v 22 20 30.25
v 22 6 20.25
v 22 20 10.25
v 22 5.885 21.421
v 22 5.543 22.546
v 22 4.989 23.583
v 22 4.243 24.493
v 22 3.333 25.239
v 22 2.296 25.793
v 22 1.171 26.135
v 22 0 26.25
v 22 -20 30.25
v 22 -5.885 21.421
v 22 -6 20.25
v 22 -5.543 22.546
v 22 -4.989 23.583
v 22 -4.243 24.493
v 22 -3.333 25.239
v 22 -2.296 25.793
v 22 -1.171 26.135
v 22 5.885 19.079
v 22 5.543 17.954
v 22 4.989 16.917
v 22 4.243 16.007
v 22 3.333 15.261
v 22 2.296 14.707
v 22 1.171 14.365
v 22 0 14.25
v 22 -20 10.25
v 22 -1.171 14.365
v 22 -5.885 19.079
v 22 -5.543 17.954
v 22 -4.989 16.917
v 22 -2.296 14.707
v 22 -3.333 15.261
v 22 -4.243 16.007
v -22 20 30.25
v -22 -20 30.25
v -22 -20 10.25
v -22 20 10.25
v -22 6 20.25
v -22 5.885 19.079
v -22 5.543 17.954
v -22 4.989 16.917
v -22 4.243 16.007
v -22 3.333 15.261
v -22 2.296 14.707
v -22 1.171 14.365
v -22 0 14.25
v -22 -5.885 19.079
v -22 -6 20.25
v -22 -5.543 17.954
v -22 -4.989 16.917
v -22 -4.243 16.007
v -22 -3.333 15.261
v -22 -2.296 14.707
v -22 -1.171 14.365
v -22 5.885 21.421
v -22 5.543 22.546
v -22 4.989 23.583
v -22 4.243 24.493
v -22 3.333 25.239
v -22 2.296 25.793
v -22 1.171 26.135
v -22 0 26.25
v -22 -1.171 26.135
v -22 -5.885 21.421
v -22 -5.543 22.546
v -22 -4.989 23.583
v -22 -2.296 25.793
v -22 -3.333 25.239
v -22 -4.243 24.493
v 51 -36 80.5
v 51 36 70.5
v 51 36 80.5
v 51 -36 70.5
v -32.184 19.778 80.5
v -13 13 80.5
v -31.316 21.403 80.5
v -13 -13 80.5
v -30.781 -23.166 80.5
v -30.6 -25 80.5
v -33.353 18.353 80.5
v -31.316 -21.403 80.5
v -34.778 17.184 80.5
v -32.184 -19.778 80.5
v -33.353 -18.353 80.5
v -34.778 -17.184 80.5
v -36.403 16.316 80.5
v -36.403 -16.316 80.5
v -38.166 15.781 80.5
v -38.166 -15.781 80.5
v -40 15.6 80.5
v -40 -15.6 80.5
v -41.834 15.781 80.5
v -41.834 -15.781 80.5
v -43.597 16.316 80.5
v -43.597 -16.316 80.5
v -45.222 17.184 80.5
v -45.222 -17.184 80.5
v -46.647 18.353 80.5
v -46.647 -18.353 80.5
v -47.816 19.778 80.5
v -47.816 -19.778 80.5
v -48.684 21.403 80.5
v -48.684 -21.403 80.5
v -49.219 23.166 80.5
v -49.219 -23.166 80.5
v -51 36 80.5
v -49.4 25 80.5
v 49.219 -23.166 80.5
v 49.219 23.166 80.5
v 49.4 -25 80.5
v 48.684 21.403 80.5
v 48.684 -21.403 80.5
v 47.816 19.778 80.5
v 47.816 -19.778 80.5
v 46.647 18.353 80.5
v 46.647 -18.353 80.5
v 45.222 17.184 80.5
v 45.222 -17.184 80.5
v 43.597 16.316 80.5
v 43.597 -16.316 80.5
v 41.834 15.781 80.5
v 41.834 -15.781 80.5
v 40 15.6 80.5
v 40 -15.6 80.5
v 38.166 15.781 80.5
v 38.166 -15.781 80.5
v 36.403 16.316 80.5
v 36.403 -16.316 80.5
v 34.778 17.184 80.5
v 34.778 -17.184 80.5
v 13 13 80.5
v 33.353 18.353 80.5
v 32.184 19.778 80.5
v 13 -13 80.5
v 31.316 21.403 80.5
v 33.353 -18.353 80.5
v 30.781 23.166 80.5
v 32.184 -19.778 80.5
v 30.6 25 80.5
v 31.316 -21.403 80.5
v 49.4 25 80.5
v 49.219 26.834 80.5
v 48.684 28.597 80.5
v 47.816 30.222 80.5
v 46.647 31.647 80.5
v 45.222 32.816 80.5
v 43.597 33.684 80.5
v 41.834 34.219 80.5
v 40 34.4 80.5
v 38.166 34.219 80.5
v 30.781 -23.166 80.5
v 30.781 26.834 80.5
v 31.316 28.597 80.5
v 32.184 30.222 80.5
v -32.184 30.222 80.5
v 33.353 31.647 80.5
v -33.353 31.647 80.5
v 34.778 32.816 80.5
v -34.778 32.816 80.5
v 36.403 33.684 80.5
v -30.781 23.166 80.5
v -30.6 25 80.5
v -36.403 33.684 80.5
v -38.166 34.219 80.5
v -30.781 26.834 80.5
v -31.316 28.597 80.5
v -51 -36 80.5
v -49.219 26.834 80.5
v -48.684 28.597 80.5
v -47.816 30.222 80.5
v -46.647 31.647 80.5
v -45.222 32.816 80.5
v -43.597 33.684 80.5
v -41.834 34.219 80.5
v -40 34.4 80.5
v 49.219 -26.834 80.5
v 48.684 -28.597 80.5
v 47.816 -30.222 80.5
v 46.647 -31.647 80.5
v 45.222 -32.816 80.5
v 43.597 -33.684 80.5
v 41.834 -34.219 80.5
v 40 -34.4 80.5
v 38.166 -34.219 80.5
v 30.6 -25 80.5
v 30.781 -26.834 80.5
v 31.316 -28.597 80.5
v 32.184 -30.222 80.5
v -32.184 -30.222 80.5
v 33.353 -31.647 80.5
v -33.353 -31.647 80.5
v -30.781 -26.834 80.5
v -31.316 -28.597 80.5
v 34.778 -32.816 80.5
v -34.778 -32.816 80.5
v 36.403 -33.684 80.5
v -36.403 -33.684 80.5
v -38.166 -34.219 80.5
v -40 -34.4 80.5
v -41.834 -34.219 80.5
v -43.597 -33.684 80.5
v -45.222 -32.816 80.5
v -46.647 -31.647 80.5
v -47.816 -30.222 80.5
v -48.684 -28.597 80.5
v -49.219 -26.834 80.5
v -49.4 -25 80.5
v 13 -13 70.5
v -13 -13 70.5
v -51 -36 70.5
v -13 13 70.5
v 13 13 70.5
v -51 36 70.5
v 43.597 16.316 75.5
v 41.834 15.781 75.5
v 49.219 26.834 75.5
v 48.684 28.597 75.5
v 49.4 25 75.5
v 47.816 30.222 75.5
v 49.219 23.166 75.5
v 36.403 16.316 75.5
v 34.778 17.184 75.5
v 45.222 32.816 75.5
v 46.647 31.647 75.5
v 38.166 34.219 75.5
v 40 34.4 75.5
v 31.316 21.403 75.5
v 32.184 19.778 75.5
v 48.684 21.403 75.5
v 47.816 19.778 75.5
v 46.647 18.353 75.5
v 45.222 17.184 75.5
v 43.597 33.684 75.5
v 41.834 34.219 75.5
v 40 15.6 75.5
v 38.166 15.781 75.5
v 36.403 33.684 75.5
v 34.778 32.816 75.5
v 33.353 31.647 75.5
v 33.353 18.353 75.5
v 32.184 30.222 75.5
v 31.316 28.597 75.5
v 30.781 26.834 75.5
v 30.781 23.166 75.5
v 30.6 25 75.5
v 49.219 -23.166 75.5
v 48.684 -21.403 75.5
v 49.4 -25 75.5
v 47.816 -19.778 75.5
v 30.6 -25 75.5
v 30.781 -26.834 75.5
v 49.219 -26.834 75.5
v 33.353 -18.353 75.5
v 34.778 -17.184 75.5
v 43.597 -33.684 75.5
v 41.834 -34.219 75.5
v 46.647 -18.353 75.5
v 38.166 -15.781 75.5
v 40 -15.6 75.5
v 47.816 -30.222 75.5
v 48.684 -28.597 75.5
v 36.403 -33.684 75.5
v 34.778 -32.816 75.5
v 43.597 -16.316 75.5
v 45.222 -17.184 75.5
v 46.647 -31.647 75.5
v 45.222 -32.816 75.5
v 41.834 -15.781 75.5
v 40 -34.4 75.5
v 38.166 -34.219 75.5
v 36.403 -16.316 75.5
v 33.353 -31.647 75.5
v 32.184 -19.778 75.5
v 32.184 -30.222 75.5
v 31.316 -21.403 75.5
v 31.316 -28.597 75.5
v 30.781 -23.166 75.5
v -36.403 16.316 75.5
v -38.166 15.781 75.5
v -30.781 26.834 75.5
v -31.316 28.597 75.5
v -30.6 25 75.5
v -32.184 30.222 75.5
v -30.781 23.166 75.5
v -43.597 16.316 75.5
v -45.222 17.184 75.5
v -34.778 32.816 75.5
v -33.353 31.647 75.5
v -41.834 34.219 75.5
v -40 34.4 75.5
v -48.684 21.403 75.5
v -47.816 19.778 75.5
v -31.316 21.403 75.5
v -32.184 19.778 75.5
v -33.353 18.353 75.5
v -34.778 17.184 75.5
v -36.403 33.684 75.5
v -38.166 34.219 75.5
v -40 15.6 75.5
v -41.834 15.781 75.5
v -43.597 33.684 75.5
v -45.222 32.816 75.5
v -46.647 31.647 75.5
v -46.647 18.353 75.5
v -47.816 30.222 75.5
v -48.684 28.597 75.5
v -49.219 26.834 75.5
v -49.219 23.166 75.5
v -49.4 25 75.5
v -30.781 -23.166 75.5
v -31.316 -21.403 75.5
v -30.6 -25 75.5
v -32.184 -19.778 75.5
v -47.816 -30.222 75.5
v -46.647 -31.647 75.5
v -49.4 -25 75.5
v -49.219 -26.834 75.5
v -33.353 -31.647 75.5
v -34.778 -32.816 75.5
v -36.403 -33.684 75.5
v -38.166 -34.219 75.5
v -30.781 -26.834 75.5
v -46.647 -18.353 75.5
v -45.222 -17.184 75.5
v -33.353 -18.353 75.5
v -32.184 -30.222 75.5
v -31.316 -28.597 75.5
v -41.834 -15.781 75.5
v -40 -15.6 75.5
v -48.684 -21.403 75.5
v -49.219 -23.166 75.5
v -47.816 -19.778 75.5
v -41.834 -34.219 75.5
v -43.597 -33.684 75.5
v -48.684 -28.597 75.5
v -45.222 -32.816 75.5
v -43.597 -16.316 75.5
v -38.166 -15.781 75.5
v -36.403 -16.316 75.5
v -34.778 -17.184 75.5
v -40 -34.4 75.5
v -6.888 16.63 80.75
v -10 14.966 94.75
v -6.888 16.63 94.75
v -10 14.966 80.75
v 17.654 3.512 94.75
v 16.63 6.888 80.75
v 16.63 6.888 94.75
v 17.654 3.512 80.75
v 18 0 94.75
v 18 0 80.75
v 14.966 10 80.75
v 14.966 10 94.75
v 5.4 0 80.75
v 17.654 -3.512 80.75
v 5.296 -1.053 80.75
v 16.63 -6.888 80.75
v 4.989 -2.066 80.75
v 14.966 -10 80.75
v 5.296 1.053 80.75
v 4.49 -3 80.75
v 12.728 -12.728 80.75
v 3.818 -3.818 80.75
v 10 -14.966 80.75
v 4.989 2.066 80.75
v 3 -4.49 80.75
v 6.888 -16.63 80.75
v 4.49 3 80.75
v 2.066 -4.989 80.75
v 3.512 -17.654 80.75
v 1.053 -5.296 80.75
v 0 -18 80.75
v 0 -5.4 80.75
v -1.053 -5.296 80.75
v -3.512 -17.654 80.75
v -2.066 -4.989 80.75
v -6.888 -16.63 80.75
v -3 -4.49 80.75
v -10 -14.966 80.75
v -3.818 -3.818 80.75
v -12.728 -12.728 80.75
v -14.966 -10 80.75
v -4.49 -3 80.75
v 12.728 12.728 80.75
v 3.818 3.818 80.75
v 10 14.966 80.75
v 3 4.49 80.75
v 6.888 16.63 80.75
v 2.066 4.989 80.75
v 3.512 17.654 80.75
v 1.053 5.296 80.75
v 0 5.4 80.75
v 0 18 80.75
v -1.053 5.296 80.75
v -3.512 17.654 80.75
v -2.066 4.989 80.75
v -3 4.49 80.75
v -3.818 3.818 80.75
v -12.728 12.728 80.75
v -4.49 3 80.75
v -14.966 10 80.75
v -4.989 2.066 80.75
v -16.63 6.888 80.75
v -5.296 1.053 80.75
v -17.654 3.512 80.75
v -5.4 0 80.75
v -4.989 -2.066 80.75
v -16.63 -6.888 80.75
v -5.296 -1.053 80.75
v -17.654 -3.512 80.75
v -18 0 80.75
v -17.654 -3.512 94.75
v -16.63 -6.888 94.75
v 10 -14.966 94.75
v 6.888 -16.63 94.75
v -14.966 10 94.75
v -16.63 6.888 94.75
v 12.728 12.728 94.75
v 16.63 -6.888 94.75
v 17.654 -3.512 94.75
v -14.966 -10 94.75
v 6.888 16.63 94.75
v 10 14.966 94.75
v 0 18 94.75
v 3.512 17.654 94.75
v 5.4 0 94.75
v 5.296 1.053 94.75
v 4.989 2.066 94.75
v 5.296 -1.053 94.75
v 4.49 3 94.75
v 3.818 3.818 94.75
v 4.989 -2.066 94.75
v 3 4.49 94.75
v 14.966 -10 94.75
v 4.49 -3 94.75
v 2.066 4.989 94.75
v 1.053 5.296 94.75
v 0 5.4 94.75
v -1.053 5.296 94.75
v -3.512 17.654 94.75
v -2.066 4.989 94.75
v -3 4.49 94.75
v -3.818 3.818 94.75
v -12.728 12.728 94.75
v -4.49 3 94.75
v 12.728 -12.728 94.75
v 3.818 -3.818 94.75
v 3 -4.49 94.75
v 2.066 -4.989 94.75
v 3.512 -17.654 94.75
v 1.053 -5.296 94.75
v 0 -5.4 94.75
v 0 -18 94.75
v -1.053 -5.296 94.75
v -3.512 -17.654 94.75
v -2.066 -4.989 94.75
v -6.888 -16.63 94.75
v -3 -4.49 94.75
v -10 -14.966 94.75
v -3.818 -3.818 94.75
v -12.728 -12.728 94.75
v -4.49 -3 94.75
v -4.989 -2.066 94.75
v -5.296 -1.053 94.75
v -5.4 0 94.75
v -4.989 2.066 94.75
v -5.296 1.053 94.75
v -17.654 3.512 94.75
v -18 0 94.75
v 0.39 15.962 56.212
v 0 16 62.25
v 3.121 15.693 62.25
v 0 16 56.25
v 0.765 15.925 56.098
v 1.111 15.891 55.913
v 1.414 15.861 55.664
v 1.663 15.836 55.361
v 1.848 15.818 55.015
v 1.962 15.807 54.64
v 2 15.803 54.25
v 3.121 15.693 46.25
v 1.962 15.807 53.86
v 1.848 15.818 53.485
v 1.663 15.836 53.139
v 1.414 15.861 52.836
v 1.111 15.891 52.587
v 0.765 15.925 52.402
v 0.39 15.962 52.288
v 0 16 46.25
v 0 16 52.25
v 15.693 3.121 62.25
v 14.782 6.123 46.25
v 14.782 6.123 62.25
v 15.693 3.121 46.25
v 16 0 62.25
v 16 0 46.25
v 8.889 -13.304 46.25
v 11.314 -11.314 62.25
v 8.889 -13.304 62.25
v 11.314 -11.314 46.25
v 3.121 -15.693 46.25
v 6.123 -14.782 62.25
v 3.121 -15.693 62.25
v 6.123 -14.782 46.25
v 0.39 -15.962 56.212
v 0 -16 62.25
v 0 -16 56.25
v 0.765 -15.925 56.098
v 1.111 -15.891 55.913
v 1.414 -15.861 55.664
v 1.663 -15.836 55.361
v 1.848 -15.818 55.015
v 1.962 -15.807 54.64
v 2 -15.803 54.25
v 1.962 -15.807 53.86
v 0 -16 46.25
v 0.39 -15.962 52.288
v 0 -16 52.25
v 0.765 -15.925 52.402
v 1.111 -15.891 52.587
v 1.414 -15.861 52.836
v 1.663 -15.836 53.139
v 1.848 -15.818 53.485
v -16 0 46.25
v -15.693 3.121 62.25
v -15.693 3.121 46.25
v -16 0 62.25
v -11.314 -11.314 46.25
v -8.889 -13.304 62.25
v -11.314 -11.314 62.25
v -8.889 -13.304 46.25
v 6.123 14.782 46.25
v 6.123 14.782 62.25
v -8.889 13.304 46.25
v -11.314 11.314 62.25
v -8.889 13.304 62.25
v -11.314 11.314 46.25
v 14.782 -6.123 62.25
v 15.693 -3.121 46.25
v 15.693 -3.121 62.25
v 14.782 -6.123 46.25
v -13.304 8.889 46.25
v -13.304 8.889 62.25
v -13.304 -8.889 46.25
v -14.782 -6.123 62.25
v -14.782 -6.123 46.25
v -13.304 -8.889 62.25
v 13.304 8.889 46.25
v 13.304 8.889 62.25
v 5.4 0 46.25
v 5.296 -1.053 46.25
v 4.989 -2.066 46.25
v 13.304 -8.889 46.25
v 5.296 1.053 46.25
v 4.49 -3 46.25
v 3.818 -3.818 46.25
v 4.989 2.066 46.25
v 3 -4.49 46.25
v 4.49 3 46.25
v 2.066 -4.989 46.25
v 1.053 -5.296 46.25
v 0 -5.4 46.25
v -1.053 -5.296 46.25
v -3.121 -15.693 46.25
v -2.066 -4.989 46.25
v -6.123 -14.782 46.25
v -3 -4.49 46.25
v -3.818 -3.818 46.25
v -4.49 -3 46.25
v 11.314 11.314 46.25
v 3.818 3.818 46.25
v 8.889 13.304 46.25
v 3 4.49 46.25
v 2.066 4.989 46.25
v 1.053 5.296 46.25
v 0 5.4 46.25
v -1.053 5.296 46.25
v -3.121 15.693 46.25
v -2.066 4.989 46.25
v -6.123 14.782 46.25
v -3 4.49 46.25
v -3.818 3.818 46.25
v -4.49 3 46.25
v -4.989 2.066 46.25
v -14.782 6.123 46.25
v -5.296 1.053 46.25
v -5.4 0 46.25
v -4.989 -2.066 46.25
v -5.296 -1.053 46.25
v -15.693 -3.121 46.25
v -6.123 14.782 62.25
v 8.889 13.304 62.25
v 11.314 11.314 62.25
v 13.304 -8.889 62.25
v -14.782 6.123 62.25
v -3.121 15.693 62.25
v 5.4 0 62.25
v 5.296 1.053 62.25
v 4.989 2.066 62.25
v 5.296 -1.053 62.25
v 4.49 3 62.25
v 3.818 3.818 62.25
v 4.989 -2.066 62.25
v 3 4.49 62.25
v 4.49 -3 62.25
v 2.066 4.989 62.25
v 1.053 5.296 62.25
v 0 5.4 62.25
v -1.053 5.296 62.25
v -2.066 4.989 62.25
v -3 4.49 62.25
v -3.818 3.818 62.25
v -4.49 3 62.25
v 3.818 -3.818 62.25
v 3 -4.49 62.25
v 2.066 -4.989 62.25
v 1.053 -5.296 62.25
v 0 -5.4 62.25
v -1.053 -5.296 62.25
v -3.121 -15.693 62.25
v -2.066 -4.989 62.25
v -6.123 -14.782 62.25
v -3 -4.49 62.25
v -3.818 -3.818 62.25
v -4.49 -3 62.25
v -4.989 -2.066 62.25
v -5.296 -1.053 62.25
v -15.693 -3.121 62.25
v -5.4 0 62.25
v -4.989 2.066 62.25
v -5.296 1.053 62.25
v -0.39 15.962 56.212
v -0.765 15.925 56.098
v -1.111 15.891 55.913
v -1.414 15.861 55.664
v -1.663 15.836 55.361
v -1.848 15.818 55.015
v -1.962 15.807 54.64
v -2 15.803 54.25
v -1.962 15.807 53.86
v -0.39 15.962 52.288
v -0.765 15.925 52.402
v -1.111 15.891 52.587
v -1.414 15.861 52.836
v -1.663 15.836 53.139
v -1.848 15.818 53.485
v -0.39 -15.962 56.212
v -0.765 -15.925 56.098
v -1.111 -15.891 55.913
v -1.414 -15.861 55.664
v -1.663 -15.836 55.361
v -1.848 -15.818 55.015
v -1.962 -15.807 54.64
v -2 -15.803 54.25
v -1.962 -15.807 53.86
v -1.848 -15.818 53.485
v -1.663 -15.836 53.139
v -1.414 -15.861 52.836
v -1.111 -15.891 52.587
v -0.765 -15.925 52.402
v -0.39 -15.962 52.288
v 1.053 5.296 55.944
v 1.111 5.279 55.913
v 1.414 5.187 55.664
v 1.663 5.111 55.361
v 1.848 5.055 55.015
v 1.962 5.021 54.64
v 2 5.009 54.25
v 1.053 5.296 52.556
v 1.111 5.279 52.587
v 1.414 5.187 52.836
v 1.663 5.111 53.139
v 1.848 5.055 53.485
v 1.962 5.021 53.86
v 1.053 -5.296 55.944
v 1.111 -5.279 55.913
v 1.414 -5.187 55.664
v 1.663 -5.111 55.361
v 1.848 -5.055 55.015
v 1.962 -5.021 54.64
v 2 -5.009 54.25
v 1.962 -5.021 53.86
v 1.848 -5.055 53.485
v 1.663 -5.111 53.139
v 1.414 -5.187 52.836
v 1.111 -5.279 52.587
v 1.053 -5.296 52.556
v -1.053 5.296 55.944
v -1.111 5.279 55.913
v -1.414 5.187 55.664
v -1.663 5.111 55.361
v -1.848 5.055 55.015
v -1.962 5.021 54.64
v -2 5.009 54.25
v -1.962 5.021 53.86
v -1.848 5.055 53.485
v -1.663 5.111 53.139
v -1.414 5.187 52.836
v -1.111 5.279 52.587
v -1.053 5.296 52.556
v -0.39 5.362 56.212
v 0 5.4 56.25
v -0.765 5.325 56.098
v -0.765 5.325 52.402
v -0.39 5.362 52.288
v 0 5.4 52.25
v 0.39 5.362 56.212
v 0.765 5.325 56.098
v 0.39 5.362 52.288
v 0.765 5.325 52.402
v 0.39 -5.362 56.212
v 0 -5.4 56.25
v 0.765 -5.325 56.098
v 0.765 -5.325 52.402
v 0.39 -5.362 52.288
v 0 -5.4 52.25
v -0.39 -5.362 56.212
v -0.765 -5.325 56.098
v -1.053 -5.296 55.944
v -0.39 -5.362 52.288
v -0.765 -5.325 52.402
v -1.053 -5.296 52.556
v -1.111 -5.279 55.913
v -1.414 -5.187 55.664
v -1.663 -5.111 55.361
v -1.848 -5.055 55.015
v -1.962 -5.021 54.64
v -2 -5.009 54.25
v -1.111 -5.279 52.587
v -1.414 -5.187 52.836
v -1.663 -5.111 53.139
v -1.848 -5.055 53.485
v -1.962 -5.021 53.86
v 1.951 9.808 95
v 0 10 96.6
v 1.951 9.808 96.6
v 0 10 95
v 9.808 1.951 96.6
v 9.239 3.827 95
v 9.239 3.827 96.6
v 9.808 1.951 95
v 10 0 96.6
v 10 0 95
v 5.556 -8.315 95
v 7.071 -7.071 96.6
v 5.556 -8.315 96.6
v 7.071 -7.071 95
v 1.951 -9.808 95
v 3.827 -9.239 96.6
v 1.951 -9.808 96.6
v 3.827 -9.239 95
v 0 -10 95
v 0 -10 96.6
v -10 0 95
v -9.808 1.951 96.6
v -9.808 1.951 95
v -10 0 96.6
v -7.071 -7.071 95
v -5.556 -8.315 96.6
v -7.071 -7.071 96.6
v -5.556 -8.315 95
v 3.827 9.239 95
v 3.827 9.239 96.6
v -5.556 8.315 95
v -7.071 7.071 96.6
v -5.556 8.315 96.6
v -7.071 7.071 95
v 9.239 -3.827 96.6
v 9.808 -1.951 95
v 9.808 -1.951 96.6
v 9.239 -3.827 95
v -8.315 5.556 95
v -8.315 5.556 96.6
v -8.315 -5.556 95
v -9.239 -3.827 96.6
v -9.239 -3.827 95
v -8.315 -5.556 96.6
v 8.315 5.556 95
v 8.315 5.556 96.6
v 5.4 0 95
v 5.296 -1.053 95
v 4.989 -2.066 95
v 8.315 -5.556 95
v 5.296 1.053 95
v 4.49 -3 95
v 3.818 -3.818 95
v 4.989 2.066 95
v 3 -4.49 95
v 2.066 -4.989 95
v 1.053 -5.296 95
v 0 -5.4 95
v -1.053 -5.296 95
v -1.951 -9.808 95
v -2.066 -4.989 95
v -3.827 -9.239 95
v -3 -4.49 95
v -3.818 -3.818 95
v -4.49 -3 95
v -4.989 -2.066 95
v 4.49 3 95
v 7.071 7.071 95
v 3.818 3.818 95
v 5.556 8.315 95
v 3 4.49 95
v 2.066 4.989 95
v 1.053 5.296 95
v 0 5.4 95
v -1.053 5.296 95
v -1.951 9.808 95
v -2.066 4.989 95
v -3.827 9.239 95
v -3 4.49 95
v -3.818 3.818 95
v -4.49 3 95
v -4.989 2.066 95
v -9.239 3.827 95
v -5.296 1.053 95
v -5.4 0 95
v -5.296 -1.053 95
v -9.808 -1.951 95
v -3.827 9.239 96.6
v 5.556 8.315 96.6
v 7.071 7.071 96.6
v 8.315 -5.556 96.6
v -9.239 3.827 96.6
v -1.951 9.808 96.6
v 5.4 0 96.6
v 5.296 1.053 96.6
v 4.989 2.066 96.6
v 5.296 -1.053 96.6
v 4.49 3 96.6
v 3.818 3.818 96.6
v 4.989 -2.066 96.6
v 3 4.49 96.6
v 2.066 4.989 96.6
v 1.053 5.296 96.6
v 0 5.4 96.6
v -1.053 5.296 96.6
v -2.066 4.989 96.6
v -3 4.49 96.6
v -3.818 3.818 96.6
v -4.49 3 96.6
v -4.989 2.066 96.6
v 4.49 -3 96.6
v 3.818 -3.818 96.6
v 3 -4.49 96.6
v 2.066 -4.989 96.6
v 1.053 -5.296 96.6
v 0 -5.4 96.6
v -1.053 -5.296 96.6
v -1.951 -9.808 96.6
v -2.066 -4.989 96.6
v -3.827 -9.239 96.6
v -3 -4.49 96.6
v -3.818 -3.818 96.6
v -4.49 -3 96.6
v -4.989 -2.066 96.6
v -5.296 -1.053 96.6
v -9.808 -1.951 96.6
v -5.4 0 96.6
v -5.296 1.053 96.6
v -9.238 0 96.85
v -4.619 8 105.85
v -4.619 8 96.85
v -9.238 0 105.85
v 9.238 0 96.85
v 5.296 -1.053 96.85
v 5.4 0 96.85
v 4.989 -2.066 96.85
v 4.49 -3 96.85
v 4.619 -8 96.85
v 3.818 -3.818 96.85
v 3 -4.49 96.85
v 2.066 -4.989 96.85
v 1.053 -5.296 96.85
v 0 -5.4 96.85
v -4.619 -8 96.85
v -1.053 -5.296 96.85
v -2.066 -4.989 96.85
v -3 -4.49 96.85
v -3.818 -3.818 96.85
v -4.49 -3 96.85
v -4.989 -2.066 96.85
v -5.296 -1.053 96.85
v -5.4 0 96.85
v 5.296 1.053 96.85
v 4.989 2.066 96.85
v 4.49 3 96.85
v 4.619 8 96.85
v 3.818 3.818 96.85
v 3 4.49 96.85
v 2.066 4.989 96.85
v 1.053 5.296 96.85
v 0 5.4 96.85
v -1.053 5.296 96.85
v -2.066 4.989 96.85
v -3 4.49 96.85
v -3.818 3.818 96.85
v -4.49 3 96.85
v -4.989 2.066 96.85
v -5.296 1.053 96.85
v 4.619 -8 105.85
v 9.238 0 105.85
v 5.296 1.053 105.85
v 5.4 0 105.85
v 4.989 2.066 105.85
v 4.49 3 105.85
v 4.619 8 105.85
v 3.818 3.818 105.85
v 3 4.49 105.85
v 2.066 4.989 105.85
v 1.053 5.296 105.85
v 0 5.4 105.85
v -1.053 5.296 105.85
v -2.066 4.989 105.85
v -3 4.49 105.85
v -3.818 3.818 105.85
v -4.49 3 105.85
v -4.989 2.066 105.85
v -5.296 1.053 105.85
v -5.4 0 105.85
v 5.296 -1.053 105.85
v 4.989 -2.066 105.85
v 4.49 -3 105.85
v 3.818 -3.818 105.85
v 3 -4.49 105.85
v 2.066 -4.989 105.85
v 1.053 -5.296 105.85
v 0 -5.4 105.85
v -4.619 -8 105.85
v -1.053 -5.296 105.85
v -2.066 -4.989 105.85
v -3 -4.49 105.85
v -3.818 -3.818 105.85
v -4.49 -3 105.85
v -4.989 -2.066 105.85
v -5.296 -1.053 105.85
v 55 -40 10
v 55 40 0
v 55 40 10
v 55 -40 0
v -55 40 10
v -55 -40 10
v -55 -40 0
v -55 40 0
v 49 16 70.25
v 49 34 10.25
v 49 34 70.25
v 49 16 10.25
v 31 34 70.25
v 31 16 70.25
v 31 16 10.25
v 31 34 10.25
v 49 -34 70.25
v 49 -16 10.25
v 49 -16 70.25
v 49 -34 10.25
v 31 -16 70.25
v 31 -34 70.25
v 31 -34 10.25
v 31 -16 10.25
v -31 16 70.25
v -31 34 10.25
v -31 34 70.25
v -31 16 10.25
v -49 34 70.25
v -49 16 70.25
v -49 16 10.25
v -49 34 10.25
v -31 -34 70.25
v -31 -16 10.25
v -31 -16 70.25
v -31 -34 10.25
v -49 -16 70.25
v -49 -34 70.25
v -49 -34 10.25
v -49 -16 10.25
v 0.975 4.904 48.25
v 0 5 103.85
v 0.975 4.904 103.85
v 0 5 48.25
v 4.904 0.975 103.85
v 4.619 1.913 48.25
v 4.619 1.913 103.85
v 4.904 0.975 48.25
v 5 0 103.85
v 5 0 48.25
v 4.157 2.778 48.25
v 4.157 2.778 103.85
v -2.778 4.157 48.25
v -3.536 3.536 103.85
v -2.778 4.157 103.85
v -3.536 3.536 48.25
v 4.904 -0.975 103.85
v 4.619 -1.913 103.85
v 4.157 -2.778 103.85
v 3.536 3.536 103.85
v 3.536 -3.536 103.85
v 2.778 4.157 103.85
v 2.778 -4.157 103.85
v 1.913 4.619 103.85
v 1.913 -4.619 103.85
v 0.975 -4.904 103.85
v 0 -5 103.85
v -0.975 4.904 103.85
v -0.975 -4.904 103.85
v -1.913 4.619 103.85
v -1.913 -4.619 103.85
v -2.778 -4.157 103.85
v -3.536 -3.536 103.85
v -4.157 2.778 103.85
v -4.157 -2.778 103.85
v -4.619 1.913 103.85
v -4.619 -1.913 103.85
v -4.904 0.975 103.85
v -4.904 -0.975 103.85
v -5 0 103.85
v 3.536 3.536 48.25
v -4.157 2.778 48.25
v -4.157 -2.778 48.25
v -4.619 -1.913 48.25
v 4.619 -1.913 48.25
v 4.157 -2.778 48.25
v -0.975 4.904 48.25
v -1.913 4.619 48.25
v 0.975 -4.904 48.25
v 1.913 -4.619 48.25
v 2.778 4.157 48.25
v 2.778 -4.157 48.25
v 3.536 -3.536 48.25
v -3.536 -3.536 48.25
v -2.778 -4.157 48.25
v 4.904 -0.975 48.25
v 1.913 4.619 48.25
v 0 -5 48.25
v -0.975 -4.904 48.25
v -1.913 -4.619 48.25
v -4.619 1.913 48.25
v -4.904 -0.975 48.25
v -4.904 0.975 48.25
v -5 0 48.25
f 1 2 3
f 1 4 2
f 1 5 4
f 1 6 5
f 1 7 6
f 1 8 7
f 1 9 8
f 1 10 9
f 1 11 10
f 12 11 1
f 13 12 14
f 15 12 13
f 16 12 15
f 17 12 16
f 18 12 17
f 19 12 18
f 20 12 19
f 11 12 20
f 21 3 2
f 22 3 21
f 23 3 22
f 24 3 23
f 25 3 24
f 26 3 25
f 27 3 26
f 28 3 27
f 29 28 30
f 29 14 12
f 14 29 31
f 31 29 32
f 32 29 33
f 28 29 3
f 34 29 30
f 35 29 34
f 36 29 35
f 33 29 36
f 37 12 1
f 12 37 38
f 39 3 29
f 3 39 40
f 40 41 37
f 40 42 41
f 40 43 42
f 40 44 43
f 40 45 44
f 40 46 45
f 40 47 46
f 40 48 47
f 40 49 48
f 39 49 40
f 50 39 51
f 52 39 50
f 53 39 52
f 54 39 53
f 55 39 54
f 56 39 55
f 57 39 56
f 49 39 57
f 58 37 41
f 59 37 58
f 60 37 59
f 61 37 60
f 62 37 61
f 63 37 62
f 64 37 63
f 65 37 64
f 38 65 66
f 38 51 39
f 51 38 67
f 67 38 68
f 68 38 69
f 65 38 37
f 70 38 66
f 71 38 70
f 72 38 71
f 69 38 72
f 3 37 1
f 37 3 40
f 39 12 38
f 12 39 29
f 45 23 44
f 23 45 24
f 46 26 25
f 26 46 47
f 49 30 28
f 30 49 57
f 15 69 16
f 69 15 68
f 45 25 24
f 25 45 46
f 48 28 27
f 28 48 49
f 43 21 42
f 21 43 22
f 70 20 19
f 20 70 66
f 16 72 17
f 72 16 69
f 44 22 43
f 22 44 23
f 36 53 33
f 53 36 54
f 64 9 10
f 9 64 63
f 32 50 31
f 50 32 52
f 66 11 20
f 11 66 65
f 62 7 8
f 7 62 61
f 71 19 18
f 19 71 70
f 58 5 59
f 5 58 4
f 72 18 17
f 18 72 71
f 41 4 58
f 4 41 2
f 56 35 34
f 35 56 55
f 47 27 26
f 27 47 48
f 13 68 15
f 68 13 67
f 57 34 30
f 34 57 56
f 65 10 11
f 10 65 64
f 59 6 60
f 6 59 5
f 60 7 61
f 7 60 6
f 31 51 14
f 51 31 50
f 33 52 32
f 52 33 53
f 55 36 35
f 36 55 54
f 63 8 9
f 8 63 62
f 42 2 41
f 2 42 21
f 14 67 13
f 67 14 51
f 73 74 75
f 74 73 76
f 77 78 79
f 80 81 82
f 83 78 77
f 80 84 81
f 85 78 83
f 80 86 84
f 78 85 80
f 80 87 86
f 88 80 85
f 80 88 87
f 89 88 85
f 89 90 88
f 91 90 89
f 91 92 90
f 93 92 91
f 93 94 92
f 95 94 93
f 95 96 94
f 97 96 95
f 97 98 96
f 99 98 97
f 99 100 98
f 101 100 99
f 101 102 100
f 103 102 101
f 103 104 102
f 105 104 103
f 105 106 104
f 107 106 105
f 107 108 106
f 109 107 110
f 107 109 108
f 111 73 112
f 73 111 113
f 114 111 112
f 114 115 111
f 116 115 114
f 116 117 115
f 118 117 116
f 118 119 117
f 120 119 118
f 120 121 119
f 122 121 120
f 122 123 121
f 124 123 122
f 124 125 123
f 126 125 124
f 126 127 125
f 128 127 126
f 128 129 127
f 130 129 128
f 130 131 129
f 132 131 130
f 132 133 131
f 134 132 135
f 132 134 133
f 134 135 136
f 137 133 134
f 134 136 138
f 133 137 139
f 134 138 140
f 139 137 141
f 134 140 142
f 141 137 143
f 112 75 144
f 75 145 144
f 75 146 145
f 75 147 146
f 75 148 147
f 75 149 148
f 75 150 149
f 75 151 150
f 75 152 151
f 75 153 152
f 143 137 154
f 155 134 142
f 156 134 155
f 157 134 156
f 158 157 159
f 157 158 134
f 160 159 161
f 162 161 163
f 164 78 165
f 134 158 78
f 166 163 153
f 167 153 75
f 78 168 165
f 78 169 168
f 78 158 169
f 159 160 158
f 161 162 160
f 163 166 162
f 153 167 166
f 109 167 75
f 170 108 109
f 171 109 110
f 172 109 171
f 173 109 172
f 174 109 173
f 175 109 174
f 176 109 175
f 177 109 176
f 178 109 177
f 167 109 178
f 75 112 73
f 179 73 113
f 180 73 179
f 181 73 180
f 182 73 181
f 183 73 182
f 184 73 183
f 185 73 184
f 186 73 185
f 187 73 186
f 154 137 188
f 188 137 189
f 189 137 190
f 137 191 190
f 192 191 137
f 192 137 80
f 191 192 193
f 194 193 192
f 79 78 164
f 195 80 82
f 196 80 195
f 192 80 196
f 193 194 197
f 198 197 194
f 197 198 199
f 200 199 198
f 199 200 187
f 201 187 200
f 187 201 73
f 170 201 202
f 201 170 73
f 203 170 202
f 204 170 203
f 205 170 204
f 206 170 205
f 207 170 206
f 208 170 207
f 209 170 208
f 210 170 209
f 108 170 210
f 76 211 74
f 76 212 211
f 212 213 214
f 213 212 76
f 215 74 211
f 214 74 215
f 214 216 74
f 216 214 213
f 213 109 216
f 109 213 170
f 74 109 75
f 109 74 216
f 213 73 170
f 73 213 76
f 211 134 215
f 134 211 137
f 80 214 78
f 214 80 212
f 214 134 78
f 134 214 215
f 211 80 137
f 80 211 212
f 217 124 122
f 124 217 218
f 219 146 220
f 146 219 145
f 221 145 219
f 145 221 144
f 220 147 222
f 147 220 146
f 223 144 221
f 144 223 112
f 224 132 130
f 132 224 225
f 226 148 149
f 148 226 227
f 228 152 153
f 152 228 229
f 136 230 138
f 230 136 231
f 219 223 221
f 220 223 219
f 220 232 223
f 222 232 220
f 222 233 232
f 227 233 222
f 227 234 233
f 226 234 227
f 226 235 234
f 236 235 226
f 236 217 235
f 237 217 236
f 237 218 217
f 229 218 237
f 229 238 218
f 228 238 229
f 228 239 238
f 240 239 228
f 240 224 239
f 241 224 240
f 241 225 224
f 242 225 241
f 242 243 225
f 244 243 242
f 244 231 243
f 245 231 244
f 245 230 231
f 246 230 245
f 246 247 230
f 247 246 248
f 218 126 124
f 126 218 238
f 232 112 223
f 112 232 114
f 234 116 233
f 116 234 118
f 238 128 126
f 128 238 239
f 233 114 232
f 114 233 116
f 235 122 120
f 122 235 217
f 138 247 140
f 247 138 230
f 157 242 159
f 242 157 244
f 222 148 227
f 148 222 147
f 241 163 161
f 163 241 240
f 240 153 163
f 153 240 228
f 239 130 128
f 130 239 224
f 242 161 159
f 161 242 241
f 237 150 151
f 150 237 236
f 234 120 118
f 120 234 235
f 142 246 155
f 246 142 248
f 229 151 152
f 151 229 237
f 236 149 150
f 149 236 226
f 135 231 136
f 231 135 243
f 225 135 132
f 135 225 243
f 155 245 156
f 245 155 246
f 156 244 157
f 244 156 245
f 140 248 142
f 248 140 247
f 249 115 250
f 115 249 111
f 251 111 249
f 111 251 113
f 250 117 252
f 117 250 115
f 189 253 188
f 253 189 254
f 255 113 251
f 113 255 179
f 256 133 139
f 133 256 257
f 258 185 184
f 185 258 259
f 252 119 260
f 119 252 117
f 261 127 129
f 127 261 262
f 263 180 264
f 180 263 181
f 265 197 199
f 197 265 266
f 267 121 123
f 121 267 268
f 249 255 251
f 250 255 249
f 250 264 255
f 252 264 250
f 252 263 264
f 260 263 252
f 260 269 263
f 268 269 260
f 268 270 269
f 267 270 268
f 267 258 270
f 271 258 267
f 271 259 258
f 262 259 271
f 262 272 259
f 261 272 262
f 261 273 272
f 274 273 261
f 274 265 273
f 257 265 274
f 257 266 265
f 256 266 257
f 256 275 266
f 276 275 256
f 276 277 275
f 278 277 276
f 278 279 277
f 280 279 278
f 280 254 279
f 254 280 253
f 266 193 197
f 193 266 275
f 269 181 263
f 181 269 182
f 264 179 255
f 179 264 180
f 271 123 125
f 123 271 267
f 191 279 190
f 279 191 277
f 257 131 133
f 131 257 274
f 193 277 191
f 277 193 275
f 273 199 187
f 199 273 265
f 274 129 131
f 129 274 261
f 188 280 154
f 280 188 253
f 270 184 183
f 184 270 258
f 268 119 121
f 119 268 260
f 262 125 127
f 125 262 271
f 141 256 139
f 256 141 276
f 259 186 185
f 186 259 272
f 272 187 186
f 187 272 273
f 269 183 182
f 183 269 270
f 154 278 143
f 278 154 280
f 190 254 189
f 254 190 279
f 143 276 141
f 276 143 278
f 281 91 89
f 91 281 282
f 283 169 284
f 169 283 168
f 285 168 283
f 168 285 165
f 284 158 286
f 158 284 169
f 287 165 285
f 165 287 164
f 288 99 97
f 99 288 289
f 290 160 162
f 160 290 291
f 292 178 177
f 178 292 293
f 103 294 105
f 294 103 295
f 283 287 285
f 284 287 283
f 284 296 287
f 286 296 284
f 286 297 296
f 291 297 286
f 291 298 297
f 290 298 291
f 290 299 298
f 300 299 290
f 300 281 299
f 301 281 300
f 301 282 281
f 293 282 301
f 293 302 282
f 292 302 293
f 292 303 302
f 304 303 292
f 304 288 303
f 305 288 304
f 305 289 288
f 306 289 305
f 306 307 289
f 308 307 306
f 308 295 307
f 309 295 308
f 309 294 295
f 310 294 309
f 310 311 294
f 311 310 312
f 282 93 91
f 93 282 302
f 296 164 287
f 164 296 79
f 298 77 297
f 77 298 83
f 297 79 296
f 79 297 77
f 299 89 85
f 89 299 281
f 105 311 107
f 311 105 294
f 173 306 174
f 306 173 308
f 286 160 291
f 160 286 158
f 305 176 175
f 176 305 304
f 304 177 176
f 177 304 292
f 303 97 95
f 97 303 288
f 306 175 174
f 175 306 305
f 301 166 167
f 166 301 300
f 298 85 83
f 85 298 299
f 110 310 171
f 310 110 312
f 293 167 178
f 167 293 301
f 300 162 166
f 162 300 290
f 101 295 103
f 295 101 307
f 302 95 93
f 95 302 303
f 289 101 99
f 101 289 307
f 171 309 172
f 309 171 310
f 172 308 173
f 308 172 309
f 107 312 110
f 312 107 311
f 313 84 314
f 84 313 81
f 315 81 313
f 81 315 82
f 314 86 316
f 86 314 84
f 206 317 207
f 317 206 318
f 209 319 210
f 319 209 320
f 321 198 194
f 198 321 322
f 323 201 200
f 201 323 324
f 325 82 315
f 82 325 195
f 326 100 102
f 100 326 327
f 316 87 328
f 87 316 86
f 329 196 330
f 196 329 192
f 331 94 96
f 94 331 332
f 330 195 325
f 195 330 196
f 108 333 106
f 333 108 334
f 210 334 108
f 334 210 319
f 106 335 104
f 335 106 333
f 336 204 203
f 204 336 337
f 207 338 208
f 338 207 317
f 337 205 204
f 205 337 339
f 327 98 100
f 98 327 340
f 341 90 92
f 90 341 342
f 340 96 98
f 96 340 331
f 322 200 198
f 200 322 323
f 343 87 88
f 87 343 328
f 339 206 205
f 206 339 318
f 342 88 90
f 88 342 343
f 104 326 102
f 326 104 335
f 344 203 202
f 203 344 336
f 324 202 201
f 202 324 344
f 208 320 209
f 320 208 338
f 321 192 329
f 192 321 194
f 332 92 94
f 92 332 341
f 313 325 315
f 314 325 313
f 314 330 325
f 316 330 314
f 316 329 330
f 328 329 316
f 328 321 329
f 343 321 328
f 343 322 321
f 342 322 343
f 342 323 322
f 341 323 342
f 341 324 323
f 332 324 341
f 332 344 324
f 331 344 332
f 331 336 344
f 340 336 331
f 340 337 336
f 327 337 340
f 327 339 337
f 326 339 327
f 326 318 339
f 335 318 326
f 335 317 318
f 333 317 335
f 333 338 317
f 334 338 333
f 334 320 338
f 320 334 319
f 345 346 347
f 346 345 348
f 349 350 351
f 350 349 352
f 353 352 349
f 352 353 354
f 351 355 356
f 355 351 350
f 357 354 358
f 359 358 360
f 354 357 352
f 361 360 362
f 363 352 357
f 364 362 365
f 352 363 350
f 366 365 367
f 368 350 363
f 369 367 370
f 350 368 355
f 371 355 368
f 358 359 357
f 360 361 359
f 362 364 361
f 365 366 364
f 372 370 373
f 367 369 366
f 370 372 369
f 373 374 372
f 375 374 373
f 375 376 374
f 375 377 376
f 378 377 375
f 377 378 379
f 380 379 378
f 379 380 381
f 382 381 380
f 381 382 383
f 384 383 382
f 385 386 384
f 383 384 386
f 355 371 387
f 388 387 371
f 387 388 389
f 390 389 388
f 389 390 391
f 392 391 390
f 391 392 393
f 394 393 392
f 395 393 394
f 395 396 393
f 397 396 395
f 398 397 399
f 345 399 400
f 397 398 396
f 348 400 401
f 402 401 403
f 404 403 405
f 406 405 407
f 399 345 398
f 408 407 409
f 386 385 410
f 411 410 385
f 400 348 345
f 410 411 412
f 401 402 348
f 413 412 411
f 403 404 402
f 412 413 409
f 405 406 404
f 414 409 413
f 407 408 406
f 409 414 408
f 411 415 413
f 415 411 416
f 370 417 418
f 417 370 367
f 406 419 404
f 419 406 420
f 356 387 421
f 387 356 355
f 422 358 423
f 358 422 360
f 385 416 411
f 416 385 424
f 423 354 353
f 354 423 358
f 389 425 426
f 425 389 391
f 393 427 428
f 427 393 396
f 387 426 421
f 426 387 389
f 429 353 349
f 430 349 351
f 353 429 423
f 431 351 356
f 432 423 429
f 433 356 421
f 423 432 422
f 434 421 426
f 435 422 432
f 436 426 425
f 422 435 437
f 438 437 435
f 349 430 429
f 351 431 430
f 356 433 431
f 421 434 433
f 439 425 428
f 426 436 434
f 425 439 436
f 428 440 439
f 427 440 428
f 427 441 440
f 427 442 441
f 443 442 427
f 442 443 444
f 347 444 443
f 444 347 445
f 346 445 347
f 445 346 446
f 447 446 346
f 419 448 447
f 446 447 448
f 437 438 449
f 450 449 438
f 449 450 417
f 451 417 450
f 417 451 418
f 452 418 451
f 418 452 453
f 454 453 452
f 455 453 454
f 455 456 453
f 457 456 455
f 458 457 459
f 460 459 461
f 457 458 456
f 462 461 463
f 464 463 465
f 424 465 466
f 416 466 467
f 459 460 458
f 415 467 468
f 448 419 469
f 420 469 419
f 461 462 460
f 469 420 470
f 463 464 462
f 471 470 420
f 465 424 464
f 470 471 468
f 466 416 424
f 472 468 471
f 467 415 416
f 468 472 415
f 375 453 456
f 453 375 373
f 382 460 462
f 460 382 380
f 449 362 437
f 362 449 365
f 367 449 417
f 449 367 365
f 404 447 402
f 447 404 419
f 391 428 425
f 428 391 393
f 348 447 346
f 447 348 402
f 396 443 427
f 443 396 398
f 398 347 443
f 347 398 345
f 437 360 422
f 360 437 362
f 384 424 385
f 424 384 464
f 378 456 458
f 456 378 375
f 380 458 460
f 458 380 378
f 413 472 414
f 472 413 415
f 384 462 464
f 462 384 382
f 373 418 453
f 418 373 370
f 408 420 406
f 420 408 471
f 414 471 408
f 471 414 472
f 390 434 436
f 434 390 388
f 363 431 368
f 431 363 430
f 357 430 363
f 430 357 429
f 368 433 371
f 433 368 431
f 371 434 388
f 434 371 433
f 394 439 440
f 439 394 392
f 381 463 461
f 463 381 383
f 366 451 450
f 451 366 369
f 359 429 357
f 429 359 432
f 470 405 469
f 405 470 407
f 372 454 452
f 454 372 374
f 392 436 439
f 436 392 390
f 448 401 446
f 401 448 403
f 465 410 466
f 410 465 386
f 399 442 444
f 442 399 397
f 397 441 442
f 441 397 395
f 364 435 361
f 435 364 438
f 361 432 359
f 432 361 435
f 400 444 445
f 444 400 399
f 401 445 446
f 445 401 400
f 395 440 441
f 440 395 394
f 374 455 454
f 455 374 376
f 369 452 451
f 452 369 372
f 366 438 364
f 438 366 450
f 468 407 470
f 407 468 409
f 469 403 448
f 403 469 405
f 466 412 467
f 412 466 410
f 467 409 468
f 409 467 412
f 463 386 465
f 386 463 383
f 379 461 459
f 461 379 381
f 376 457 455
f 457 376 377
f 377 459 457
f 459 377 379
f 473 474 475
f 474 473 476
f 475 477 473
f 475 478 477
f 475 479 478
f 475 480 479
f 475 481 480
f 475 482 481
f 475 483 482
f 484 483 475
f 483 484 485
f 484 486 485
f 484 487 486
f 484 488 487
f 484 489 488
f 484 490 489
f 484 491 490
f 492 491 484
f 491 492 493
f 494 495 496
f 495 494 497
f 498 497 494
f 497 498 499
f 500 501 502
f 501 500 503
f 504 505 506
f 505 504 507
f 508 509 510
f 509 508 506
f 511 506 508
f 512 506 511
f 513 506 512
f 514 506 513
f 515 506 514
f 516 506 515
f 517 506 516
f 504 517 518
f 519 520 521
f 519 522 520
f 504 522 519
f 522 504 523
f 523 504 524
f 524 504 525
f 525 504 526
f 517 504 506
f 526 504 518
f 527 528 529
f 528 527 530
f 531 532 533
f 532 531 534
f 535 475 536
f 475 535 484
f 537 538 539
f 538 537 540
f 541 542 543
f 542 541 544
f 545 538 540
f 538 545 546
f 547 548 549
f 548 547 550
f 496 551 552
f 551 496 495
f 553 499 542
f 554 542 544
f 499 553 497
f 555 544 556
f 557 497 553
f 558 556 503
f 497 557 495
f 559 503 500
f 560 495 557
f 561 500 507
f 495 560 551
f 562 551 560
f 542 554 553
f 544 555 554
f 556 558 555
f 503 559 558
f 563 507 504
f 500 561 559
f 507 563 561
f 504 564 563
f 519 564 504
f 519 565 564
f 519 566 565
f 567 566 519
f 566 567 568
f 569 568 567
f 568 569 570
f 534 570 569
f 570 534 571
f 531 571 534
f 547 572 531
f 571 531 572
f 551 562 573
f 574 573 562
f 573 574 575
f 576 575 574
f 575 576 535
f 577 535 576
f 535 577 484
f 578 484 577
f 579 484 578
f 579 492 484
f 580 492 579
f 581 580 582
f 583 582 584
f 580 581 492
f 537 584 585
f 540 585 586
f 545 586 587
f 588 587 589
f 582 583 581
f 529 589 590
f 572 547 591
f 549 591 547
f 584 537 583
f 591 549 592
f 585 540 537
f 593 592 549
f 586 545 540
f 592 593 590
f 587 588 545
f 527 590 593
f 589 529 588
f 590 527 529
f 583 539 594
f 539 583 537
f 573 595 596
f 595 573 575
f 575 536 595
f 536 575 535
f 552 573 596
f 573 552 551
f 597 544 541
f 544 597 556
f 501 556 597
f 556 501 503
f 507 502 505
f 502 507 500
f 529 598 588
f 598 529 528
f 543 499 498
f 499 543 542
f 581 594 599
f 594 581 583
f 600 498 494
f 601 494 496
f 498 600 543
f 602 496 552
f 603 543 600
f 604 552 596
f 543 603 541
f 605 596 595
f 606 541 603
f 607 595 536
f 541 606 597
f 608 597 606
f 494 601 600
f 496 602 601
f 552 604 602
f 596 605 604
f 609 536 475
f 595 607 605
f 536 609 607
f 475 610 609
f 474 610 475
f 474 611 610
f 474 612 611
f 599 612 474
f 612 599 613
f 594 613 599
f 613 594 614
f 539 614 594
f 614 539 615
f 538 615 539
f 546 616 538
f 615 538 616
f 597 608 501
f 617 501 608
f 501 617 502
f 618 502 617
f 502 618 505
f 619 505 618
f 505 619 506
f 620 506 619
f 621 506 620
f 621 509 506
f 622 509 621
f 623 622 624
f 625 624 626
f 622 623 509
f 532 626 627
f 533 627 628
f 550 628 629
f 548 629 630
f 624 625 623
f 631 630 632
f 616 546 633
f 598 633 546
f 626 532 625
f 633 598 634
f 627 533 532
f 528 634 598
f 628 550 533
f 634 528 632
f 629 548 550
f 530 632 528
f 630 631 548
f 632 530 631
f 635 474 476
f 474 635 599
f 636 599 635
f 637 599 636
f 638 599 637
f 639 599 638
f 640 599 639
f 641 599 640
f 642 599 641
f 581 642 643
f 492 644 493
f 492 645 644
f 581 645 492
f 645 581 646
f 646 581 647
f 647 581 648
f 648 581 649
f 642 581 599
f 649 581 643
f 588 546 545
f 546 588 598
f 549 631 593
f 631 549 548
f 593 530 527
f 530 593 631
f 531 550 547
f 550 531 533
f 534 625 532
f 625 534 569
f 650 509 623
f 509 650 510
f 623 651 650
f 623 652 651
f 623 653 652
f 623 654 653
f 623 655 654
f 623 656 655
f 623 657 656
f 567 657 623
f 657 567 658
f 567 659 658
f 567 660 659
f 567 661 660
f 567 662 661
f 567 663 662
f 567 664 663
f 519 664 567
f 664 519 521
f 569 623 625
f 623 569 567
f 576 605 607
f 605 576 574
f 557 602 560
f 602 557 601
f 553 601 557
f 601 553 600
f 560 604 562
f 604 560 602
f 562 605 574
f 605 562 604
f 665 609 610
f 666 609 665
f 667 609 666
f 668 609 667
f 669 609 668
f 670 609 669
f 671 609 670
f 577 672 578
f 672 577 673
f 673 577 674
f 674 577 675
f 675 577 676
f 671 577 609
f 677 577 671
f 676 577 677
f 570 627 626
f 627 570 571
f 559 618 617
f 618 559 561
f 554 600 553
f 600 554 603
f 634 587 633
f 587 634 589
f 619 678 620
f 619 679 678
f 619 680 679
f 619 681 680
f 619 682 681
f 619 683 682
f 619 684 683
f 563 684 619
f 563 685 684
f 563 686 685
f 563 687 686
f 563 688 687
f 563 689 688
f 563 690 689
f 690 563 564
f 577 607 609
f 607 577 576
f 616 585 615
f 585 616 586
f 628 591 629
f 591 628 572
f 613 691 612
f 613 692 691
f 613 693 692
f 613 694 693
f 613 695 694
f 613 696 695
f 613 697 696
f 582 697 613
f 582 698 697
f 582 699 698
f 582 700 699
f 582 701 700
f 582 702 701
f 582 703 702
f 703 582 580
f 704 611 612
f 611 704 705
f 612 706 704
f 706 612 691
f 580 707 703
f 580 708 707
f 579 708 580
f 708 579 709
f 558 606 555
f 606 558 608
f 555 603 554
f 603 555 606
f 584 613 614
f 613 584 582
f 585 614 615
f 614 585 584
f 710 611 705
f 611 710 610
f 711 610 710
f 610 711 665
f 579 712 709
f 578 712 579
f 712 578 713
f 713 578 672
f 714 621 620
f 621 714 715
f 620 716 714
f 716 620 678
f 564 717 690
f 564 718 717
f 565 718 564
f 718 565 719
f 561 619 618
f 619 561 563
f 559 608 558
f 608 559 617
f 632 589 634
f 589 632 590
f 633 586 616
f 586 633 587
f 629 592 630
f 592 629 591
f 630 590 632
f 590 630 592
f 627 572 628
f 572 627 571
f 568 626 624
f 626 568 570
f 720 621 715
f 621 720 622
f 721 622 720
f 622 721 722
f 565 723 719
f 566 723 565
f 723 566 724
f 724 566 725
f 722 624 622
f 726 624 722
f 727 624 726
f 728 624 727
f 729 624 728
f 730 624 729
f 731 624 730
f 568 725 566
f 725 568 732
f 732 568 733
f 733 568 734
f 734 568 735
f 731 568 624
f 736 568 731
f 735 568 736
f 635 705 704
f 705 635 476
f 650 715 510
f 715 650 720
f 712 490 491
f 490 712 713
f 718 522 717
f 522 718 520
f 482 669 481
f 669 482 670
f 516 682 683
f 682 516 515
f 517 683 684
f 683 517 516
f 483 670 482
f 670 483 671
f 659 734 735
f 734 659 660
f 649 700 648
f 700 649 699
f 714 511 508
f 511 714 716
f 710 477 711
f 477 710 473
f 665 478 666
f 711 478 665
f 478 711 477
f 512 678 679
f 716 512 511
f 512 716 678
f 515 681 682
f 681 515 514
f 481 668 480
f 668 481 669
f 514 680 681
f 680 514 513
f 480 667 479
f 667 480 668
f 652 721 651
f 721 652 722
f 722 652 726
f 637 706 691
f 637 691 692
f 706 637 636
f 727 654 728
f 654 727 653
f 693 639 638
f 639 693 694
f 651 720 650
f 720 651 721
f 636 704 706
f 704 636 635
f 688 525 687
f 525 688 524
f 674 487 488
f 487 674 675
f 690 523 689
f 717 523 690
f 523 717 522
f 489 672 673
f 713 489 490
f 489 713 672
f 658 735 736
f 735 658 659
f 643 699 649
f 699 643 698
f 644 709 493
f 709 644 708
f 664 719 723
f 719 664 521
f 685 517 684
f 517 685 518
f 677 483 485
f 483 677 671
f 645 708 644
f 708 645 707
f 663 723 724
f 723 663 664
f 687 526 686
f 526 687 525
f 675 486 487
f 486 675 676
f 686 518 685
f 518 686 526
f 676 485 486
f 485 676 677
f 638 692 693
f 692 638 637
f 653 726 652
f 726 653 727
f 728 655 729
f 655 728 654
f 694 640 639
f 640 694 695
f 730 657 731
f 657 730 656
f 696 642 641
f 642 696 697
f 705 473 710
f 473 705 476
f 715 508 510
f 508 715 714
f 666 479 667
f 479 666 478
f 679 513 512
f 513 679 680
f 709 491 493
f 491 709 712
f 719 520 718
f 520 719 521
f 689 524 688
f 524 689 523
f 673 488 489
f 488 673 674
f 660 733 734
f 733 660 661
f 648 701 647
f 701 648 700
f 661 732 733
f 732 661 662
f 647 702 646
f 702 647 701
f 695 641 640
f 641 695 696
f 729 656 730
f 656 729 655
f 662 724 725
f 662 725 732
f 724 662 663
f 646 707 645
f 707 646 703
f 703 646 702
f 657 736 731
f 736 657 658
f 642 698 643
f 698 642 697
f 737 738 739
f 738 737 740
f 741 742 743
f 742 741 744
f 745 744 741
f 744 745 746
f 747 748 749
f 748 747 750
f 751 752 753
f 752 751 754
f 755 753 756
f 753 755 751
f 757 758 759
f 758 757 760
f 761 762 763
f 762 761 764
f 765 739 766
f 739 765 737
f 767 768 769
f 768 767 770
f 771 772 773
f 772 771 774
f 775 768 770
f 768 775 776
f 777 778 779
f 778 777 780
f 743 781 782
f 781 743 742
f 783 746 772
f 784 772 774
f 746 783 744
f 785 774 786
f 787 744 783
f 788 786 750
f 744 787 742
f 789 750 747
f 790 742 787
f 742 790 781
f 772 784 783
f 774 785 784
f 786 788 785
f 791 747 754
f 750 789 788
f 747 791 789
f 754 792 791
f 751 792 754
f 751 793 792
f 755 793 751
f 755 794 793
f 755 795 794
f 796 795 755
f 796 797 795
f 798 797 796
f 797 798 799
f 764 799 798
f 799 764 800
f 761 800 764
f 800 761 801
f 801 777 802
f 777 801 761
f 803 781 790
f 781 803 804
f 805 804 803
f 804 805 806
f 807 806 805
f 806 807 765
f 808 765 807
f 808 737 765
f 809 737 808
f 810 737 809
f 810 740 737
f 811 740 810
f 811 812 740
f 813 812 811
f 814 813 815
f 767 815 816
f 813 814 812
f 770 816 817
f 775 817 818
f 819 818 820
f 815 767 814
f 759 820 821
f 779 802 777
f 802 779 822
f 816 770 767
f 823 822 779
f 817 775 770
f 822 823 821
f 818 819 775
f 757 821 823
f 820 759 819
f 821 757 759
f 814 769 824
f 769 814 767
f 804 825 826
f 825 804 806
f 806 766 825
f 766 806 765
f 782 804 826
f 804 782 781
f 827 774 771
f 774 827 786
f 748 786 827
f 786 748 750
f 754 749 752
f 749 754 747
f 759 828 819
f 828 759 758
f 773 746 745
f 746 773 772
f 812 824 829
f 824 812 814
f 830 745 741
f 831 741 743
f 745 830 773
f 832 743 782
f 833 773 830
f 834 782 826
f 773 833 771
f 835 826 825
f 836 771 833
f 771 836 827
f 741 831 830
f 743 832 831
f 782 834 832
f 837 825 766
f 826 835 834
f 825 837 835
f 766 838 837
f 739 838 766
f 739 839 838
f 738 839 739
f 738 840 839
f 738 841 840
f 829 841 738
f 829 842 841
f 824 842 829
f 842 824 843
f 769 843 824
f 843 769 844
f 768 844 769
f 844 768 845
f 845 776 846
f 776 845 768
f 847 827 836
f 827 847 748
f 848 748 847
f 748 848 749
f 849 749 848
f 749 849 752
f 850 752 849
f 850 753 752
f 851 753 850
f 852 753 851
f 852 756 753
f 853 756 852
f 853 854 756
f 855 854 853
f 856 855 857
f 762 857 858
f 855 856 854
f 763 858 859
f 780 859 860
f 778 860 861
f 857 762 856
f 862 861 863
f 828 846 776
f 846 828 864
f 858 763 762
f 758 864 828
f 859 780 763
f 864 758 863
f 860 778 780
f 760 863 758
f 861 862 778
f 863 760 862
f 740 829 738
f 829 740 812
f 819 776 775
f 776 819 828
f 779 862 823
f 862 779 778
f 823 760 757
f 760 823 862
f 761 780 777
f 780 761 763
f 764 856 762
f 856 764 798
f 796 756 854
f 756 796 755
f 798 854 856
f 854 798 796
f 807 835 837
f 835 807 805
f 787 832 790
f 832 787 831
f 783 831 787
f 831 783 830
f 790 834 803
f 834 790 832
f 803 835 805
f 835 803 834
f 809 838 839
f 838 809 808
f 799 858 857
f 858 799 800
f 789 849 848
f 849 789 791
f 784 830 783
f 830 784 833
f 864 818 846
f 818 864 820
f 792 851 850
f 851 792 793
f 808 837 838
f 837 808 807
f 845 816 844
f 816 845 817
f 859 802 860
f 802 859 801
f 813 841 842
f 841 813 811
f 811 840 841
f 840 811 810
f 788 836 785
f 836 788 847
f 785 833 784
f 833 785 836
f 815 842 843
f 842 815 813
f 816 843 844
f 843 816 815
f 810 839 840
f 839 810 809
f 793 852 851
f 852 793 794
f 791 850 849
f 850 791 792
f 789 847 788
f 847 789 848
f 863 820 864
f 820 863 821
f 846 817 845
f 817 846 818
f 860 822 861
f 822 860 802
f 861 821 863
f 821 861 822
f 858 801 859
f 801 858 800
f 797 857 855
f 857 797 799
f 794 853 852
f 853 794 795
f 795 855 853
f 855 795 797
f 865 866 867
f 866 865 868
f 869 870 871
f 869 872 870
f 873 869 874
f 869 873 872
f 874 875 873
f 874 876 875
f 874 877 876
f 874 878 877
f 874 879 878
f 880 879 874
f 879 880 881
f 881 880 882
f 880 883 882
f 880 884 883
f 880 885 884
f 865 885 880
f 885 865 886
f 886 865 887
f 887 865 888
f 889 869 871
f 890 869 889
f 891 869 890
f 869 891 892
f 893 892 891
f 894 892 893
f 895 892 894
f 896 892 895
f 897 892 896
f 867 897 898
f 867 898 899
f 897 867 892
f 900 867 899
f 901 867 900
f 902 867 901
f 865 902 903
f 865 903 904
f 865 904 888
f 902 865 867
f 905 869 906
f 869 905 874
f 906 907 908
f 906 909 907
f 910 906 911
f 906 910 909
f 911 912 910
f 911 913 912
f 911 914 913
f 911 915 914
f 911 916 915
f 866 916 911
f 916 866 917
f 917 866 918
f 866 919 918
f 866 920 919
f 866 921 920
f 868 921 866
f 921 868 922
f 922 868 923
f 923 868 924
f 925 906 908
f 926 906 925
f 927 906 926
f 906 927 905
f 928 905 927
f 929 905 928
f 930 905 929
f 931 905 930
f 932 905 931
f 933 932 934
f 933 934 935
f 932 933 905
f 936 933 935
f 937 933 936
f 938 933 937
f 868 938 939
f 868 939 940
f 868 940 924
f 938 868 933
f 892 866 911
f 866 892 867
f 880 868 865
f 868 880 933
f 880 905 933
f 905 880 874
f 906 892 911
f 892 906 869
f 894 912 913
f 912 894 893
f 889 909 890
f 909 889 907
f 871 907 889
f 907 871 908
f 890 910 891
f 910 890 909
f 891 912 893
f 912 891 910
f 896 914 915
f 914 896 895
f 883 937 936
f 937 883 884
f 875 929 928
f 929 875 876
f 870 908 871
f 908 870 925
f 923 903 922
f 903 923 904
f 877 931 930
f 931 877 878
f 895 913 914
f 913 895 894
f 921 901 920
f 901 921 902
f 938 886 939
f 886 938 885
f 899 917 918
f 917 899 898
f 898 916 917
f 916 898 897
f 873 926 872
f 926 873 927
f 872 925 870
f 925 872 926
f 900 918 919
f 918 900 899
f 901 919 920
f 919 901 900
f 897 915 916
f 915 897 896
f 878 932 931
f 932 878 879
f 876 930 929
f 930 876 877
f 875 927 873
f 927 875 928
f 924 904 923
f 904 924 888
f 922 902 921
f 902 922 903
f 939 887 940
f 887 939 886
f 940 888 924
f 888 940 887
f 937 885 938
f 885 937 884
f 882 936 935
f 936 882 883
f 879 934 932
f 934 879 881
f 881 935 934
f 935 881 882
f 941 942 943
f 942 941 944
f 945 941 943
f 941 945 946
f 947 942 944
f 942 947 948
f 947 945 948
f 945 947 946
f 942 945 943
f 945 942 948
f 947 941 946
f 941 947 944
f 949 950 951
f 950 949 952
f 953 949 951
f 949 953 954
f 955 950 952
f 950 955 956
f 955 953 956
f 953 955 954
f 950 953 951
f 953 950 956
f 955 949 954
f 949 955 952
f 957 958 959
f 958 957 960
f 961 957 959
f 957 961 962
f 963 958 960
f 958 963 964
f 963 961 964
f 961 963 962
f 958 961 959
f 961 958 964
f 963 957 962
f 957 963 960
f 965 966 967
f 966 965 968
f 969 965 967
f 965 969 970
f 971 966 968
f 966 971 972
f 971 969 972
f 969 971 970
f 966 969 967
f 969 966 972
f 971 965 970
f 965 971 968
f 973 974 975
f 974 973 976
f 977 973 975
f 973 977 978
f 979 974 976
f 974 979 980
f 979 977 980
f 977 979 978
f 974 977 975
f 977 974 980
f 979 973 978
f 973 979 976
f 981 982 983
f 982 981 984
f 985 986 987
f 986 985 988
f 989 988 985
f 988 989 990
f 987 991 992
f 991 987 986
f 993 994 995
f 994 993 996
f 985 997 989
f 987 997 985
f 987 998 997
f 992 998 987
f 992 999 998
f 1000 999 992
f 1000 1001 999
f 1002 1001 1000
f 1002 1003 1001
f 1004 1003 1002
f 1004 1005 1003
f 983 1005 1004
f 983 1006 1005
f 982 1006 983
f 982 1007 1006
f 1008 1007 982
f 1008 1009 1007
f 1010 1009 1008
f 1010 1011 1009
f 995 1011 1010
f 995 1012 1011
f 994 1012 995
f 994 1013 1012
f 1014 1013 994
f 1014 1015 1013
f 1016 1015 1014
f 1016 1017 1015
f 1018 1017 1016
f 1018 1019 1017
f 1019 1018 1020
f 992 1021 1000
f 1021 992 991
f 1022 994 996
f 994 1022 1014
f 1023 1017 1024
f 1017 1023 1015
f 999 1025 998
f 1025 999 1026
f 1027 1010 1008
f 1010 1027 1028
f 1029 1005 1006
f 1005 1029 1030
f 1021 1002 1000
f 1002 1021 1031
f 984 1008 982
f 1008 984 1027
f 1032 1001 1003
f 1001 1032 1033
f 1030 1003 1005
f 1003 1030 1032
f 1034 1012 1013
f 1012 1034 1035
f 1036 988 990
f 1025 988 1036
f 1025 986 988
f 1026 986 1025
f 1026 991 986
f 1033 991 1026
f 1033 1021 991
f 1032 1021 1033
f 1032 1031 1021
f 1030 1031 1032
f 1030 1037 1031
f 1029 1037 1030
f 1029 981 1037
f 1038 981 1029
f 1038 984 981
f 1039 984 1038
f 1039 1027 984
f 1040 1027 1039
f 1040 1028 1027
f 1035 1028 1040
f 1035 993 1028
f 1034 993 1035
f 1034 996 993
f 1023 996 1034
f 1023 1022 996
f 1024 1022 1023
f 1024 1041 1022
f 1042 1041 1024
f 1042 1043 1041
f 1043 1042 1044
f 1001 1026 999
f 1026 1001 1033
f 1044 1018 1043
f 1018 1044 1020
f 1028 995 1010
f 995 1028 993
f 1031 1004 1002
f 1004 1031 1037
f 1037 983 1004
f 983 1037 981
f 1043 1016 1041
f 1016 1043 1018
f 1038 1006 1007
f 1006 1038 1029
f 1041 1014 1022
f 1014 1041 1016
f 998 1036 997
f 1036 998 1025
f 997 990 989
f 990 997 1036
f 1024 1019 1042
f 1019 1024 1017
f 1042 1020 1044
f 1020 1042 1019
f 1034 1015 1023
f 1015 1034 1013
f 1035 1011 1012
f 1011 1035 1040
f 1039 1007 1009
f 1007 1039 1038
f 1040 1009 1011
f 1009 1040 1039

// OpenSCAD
$fn = 32;

// ------------------------------------------------------------------------
// Arbor press fixture: screw d10, posts 60 mm, gap 16 mm
// Every part is its own module, assembly() places every instance.
// ------------------------------------------------------------------------

// --- part 1 ---
module press_bed() {
  difference() {
    translate([-55, -40, 0]) cube([110, 80, 10]);
  }
}

// --- part 2 ---
module anvil_block() {
  difference() {
    translate([-22, -20, 0]) cube([44, 40, 20]);
    translate([0, 0, 10]) rotate([0, 90, 0]) cylinder(h = 46, d = 12, center = true);
  }
}

// --- part 3 ---
module press_post_a() {
  translate([-9, -9, 0]) cube([18, 18, 60]);
}

// --- part 4 ---
module press_post_b() {
  translate([-9, -9, 0]) cube([18, 18, 60]);
}

// --- part 5 ---
module press_post_c() {
  translate([-9, -9, 0]) cube([18, 18, 60]);
}

// --- part 6 ---
module press_post_d() {
  translate([-9, -9, 0]) cube([18, 18, 60]);
}

// --- part 7 ---
module press_frame() {
  difference() {
    translate([-51, -36, 0]) cube([102, 72, 10]);
    translate([-13, -13, -1]) cube([26, 26, 12]);
    translate([40, 25, 5]) cylinder(h = 6, d = 18.8);
    translate([40, -25, 5]) cylinder(h = 6, d = 18.8);
    translate([-40, 25, 5]) cylinder(h = 6, d = 18.8);
    translate([-40, -25, 5]) cylinder(h = 6, d = 18.8);
  }
}

// --- part 8 ---
module guide_ring() {
  difference() {
      translate([0, 0, 0]) cylinder(h = 14, d = 36);
      translate([0, 0, -1]) cylinder(h = 16, d = 10.8);
    }
}

// --- part 9 ---
module press_screw() {
  translate([0, 0, -27.8]) cylinder(h = 55.6, d = 10);
}

// --- part 10 ---
module press_head() {
  difference() {
    cylinder(h = 16, d = 32);
    translate([0, 0, -1]) cylinder(h = 18, d = 10.8);
    translate([0, 0, 8]) rotate([90, 0, 0]) cylinder(h = 34, d = 4, center = true);
  }
}

// --- part 11 ---
module nut_washer() {
  difference() {
      translate([0, 0, 0]) cylinder(h = 1.6, d = 20);
      translate([0, 0, -1]) cylinder(h = 3.6, d = 10.8);
    }
}

// --- part 12 ---
module press_nut() {
  difference() {
    linear_extrude(height = 9) polygon(points = [[9.238, 0], [4.619, 8], [-4.619, 8], [-9.238, 0], [-4.619, -8], [4.619, -8]]);
    translate([0, 0, -1]) cylinder(h = 11, d = 10.8);
  }
}

// --- assembly ---
module assembly() {
  color([0.80, 0.24, 0.20]) translate([0, 0, 0]) rotate([0, 0, 0]) press_bed();
  color([0.20, 0.45, 0.75]) translate([0, 0, 10.25]) rotate([0, 0, 0]) anvil_block();
  color([0.25, 0.62, 0.32]) translate([40, 25, 10.25]) rotate([0, 0, 0]) press_post_a();
  color([0.92, 0.70, 0.18]) translate([40, -25, 10.25]) rotate([0, 0, 0]) press_post_b();
  color([0.58, 0.35, 0.70]) translate([-40, 25, 10.25]) rotate([0, 0, 0]) press_post_c();
  color([0.16, 0.66, 0.66]) translate([-40, -25, 10.25]) rotate([0, 0, 0]) press_post_d();
  color([0.85, 0.48, 0.18]) translate([0, 0, 70.5]) rotate([0, 0, 0]) press_frame();
  color([0.55, 0.60, 0.65]) translate([0, 0, 80.75]) rotate([0, 0, 0]) guide_ring();
  color([0.75, 0.30, 0.55]) translate([0, 0, 76.05]) rotate([0, 0, 0]) press_screw();
  color([0.42, 0.52, 0.28]) translate([0, 0, 46.25]) rotate([0, 0, 0]) press_head();
  color([0.80, 0.24, 0.20]) translate([0, 0, 95]) rotate([0, 0, 0]) nut_washer();
  color([0.20, 0.45, 0.75]) translate([0, 0, 96.85]) rotate([0, 0, 0]) press_nut();
}

assembly();
